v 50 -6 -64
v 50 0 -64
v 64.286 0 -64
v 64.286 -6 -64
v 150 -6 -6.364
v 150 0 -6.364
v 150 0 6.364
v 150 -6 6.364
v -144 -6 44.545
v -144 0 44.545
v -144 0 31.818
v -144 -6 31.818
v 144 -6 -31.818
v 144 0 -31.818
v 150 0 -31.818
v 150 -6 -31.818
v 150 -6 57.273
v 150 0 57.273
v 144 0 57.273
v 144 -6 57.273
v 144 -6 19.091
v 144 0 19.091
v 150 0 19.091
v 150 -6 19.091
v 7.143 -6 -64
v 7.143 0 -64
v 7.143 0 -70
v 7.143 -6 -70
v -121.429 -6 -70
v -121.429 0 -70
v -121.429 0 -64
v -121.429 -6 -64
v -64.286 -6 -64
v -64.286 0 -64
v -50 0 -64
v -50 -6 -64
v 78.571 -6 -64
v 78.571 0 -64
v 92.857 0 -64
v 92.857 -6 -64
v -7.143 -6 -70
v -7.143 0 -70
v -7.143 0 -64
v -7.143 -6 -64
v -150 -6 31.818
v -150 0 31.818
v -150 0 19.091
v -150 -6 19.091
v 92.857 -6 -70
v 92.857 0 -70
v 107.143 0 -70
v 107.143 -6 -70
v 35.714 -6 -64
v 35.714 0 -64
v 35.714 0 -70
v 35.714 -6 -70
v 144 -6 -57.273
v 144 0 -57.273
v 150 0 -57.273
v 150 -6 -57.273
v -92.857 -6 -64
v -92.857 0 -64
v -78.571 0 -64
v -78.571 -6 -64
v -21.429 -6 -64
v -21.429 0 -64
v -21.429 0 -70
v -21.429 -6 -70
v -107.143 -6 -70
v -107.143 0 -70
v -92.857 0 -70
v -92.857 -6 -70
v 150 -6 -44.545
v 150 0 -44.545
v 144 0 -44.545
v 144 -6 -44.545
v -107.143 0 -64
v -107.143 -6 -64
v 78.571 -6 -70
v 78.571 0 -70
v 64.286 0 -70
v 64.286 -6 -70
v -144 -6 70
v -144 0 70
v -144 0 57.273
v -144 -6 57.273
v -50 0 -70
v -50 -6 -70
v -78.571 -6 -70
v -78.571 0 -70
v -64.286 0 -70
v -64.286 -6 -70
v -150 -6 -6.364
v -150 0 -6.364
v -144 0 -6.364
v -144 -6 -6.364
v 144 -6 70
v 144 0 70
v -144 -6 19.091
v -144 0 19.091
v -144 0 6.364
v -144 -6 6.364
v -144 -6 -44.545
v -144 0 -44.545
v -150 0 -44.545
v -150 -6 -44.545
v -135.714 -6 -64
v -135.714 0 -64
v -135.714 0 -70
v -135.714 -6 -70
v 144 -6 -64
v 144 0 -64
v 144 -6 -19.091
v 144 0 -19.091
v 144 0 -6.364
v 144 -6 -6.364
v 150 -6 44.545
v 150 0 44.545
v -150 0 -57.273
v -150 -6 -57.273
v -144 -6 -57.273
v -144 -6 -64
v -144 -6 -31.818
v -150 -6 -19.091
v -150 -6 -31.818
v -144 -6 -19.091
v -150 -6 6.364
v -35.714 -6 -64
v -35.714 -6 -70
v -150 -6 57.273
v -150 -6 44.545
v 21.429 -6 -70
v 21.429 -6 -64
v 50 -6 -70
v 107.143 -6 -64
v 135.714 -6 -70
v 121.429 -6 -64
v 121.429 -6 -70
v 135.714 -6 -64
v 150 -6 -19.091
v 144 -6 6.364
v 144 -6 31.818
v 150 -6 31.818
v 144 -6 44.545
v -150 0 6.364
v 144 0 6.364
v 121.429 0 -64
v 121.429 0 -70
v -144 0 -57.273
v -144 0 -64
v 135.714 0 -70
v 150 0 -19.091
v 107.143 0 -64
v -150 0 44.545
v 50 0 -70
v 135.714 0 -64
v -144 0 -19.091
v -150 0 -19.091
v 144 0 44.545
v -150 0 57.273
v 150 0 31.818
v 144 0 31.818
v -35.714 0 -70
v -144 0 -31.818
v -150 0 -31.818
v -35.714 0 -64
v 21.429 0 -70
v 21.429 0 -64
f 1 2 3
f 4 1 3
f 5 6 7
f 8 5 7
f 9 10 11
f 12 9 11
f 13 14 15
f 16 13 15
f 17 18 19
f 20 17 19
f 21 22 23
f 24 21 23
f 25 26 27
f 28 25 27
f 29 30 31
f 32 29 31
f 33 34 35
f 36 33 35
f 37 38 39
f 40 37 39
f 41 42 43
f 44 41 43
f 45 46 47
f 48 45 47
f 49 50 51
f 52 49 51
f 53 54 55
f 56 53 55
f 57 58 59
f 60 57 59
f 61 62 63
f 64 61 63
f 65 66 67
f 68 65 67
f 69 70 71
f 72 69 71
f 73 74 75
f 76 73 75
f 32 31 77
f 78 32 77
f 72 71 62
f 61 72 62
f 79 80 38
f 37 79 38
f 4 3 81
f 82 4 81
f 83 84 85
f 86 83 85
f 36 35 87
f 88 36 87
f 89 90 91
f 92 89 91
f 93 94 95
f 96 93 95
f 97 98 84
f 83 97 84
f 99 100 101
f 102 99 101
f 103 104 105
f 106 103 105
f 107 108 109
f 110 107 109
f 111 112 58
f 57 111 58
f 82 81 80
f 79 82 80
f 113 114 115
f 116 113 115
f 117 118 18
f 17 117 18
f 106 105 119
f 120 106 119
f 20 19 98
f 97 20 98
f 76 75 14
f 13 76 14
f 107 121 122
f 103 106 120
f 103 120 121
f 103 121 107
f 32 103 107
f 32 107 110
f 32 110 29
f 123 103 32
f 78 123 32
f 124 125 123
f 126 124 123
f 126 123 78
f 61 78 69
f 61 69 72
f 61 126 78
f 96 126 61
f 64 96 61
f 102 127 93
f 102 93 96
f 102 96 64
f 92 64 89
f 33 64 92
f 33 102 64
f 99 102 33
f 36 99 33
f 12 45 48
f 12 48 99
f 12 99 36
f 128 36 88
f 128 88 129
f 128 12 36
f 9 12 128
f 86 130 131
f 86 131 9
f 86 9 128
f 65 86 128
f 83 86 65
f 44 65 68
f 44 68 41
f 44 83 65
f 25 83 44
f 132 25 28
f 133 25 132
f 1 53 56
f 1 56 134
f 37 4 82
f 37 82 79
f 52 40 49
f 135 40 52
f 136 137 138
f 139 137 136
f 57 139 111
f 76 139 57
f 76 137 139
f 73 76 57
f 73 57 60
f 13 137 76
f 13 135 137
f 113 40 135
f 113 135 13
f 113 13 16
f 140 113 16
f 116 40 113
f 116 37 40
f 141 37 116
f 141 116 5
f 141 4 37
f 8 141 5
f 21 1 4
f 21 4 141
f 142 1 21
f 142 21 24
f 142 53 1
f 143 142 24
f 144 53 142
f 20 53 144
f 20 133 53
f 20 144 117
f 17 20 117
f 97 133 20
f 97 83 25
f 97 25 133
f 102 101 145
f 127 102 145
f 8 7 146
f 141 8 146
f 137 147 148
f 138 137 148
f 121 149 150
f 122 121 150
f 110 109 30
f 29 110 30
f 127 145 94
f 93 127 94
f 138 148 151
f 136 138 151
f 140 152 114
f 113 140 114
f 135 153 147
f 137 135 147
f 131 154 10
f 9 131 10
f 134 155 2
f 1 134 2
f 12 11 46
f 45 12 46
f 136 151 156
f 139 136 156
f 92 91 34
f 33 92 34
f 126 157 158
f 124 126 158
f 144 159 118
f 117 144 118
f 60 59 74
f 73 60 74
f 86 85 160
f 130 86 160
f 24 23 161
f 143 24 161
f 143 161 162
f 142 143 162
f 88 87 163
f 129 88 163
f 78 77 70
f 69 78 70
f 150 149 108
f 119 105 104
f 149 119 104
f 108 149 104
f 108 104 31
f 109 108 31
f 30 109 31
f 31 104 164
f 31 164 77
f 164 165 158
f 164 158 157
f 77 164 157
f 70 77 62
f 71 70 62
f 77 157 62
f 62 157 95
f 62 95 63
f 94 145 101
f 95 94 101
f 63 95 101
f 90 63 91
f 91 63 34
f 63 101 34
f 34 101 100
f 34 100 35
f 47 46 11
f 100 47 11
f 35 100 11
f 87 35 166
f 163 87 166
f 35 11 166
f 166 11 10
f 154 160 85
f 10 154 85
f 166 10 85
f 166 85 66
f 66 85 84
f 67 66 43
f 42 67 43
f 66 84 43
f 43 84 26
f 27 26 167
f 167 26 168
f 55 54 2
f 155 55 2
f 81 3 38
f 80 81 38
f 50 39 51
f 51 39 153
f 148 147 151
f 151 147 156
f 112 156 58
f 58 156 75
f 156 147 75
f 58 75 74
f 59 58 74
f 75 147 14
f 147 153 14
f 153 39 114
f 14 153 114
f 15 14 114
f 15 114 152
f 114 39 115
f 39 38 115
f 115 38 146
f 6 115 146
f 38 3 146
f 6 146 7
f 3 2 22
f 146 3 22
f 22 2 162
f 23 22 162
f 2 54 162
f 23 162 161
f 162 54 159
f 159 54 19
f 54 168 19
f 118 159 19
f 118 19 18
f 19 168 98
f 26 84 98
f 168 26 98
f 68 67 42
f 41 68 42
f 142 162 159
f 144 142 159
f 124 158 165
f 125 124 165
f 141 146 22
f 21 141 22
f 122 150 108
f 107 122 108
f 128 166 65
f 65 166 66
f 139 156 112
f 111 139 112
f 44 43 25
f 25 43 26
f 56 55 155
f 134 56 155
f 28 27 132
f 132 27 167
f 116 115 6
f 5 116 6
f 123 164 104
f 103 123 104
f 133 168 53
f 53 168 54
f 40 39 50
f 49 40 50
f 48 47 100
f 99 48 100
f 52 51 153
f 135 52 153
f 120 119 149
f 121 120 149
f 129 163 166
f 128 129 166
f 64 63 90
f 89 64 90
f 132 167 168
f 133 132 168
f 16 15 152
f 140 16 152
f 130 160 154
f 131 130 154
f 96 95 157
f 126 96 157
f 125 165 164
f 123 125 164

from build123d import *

# Parameters (mm, degrees)
F1_DEPTH = 6


with BuildPart() as f1:
    # F0 (on Front) → F1 (new body)
    with BuildSketch(Plane.XZ):
        Polygon((144, 57.272727), (144, 70), (-144, 70), (-144, 57.272727), (-150, 57.272727), (-150, 44.545455), (-144, 44.545455), (-144, 37.818182), (-144, 31.818182), (-150, 31.818182), (-150, 19.090909), (-144, 19.090909), (-144, 12.363636), (-144, 6.363636), (-150, 6.363636), (-150, -6.363636), (-144, -6.363636), (-144, -13.090909), (-144, -19.090909), (-150, -19.090909), (-150, -31.818182), (-144, -31.818182), (-144, -38.545455), (-144, -44.545455), (-150, -44.545455), (-150, -57.272727), (-144, -57.272727), (-144, -64), (-135.714286, -64), (-135.714286, -70), (-121.428571, -70), (-121.428571, -64), (-107.142857, -64), (-107.142857, -70), (-92.857143, -70), (-92.857143, -64), (-78.571429, -64), (-78.571429, -70), (-64.285714, -70), (-64.285714, -64), (-50, -64), (-50, -70), (-35.714286, -70), (-35.714286, -64), (-21.428571, -64), (-21.428571, -70), (-7.142857, -70), (-7.142857, -64), (7.142857, -64), (7.142857, -70), (21.428571, -70), (21.428571, -64), (35.714286, -64), (35.714286, -70), (50, -70), (50, -64), (64.285714, -64), (64.285714, -70), (78.571429, -70), (78.571429, -64), (92.857143, -64), (92.857143, -70), (107.142857, -70), (107.142857, -64), (121.428571, -64), (121.428571, -70), (135.714286, -70), (135.714286, -64), (144, -64), (144, -57.272727), (150, -57.272727), (150, -44.545455), (144, -44.545455), (144, -38.545455), (144, -31.818182), (150, -31.818182), (150, -19.090909), (144, -19.090909), (144, -13.090909), (144, -6.363636), (150, -6.363636), (150, 6.363636), (144, 6.363636), (144, 12.363636), (144, 19.090909), (150, 19.090909), (150, 31.818182), (144, 31.818182), (144, 37.818182), (144, 44.545455), (150, 44.545455), (150, 57.272727), align=None)
    extrude(amount=F1_DEPTH)


solid = f1.part
